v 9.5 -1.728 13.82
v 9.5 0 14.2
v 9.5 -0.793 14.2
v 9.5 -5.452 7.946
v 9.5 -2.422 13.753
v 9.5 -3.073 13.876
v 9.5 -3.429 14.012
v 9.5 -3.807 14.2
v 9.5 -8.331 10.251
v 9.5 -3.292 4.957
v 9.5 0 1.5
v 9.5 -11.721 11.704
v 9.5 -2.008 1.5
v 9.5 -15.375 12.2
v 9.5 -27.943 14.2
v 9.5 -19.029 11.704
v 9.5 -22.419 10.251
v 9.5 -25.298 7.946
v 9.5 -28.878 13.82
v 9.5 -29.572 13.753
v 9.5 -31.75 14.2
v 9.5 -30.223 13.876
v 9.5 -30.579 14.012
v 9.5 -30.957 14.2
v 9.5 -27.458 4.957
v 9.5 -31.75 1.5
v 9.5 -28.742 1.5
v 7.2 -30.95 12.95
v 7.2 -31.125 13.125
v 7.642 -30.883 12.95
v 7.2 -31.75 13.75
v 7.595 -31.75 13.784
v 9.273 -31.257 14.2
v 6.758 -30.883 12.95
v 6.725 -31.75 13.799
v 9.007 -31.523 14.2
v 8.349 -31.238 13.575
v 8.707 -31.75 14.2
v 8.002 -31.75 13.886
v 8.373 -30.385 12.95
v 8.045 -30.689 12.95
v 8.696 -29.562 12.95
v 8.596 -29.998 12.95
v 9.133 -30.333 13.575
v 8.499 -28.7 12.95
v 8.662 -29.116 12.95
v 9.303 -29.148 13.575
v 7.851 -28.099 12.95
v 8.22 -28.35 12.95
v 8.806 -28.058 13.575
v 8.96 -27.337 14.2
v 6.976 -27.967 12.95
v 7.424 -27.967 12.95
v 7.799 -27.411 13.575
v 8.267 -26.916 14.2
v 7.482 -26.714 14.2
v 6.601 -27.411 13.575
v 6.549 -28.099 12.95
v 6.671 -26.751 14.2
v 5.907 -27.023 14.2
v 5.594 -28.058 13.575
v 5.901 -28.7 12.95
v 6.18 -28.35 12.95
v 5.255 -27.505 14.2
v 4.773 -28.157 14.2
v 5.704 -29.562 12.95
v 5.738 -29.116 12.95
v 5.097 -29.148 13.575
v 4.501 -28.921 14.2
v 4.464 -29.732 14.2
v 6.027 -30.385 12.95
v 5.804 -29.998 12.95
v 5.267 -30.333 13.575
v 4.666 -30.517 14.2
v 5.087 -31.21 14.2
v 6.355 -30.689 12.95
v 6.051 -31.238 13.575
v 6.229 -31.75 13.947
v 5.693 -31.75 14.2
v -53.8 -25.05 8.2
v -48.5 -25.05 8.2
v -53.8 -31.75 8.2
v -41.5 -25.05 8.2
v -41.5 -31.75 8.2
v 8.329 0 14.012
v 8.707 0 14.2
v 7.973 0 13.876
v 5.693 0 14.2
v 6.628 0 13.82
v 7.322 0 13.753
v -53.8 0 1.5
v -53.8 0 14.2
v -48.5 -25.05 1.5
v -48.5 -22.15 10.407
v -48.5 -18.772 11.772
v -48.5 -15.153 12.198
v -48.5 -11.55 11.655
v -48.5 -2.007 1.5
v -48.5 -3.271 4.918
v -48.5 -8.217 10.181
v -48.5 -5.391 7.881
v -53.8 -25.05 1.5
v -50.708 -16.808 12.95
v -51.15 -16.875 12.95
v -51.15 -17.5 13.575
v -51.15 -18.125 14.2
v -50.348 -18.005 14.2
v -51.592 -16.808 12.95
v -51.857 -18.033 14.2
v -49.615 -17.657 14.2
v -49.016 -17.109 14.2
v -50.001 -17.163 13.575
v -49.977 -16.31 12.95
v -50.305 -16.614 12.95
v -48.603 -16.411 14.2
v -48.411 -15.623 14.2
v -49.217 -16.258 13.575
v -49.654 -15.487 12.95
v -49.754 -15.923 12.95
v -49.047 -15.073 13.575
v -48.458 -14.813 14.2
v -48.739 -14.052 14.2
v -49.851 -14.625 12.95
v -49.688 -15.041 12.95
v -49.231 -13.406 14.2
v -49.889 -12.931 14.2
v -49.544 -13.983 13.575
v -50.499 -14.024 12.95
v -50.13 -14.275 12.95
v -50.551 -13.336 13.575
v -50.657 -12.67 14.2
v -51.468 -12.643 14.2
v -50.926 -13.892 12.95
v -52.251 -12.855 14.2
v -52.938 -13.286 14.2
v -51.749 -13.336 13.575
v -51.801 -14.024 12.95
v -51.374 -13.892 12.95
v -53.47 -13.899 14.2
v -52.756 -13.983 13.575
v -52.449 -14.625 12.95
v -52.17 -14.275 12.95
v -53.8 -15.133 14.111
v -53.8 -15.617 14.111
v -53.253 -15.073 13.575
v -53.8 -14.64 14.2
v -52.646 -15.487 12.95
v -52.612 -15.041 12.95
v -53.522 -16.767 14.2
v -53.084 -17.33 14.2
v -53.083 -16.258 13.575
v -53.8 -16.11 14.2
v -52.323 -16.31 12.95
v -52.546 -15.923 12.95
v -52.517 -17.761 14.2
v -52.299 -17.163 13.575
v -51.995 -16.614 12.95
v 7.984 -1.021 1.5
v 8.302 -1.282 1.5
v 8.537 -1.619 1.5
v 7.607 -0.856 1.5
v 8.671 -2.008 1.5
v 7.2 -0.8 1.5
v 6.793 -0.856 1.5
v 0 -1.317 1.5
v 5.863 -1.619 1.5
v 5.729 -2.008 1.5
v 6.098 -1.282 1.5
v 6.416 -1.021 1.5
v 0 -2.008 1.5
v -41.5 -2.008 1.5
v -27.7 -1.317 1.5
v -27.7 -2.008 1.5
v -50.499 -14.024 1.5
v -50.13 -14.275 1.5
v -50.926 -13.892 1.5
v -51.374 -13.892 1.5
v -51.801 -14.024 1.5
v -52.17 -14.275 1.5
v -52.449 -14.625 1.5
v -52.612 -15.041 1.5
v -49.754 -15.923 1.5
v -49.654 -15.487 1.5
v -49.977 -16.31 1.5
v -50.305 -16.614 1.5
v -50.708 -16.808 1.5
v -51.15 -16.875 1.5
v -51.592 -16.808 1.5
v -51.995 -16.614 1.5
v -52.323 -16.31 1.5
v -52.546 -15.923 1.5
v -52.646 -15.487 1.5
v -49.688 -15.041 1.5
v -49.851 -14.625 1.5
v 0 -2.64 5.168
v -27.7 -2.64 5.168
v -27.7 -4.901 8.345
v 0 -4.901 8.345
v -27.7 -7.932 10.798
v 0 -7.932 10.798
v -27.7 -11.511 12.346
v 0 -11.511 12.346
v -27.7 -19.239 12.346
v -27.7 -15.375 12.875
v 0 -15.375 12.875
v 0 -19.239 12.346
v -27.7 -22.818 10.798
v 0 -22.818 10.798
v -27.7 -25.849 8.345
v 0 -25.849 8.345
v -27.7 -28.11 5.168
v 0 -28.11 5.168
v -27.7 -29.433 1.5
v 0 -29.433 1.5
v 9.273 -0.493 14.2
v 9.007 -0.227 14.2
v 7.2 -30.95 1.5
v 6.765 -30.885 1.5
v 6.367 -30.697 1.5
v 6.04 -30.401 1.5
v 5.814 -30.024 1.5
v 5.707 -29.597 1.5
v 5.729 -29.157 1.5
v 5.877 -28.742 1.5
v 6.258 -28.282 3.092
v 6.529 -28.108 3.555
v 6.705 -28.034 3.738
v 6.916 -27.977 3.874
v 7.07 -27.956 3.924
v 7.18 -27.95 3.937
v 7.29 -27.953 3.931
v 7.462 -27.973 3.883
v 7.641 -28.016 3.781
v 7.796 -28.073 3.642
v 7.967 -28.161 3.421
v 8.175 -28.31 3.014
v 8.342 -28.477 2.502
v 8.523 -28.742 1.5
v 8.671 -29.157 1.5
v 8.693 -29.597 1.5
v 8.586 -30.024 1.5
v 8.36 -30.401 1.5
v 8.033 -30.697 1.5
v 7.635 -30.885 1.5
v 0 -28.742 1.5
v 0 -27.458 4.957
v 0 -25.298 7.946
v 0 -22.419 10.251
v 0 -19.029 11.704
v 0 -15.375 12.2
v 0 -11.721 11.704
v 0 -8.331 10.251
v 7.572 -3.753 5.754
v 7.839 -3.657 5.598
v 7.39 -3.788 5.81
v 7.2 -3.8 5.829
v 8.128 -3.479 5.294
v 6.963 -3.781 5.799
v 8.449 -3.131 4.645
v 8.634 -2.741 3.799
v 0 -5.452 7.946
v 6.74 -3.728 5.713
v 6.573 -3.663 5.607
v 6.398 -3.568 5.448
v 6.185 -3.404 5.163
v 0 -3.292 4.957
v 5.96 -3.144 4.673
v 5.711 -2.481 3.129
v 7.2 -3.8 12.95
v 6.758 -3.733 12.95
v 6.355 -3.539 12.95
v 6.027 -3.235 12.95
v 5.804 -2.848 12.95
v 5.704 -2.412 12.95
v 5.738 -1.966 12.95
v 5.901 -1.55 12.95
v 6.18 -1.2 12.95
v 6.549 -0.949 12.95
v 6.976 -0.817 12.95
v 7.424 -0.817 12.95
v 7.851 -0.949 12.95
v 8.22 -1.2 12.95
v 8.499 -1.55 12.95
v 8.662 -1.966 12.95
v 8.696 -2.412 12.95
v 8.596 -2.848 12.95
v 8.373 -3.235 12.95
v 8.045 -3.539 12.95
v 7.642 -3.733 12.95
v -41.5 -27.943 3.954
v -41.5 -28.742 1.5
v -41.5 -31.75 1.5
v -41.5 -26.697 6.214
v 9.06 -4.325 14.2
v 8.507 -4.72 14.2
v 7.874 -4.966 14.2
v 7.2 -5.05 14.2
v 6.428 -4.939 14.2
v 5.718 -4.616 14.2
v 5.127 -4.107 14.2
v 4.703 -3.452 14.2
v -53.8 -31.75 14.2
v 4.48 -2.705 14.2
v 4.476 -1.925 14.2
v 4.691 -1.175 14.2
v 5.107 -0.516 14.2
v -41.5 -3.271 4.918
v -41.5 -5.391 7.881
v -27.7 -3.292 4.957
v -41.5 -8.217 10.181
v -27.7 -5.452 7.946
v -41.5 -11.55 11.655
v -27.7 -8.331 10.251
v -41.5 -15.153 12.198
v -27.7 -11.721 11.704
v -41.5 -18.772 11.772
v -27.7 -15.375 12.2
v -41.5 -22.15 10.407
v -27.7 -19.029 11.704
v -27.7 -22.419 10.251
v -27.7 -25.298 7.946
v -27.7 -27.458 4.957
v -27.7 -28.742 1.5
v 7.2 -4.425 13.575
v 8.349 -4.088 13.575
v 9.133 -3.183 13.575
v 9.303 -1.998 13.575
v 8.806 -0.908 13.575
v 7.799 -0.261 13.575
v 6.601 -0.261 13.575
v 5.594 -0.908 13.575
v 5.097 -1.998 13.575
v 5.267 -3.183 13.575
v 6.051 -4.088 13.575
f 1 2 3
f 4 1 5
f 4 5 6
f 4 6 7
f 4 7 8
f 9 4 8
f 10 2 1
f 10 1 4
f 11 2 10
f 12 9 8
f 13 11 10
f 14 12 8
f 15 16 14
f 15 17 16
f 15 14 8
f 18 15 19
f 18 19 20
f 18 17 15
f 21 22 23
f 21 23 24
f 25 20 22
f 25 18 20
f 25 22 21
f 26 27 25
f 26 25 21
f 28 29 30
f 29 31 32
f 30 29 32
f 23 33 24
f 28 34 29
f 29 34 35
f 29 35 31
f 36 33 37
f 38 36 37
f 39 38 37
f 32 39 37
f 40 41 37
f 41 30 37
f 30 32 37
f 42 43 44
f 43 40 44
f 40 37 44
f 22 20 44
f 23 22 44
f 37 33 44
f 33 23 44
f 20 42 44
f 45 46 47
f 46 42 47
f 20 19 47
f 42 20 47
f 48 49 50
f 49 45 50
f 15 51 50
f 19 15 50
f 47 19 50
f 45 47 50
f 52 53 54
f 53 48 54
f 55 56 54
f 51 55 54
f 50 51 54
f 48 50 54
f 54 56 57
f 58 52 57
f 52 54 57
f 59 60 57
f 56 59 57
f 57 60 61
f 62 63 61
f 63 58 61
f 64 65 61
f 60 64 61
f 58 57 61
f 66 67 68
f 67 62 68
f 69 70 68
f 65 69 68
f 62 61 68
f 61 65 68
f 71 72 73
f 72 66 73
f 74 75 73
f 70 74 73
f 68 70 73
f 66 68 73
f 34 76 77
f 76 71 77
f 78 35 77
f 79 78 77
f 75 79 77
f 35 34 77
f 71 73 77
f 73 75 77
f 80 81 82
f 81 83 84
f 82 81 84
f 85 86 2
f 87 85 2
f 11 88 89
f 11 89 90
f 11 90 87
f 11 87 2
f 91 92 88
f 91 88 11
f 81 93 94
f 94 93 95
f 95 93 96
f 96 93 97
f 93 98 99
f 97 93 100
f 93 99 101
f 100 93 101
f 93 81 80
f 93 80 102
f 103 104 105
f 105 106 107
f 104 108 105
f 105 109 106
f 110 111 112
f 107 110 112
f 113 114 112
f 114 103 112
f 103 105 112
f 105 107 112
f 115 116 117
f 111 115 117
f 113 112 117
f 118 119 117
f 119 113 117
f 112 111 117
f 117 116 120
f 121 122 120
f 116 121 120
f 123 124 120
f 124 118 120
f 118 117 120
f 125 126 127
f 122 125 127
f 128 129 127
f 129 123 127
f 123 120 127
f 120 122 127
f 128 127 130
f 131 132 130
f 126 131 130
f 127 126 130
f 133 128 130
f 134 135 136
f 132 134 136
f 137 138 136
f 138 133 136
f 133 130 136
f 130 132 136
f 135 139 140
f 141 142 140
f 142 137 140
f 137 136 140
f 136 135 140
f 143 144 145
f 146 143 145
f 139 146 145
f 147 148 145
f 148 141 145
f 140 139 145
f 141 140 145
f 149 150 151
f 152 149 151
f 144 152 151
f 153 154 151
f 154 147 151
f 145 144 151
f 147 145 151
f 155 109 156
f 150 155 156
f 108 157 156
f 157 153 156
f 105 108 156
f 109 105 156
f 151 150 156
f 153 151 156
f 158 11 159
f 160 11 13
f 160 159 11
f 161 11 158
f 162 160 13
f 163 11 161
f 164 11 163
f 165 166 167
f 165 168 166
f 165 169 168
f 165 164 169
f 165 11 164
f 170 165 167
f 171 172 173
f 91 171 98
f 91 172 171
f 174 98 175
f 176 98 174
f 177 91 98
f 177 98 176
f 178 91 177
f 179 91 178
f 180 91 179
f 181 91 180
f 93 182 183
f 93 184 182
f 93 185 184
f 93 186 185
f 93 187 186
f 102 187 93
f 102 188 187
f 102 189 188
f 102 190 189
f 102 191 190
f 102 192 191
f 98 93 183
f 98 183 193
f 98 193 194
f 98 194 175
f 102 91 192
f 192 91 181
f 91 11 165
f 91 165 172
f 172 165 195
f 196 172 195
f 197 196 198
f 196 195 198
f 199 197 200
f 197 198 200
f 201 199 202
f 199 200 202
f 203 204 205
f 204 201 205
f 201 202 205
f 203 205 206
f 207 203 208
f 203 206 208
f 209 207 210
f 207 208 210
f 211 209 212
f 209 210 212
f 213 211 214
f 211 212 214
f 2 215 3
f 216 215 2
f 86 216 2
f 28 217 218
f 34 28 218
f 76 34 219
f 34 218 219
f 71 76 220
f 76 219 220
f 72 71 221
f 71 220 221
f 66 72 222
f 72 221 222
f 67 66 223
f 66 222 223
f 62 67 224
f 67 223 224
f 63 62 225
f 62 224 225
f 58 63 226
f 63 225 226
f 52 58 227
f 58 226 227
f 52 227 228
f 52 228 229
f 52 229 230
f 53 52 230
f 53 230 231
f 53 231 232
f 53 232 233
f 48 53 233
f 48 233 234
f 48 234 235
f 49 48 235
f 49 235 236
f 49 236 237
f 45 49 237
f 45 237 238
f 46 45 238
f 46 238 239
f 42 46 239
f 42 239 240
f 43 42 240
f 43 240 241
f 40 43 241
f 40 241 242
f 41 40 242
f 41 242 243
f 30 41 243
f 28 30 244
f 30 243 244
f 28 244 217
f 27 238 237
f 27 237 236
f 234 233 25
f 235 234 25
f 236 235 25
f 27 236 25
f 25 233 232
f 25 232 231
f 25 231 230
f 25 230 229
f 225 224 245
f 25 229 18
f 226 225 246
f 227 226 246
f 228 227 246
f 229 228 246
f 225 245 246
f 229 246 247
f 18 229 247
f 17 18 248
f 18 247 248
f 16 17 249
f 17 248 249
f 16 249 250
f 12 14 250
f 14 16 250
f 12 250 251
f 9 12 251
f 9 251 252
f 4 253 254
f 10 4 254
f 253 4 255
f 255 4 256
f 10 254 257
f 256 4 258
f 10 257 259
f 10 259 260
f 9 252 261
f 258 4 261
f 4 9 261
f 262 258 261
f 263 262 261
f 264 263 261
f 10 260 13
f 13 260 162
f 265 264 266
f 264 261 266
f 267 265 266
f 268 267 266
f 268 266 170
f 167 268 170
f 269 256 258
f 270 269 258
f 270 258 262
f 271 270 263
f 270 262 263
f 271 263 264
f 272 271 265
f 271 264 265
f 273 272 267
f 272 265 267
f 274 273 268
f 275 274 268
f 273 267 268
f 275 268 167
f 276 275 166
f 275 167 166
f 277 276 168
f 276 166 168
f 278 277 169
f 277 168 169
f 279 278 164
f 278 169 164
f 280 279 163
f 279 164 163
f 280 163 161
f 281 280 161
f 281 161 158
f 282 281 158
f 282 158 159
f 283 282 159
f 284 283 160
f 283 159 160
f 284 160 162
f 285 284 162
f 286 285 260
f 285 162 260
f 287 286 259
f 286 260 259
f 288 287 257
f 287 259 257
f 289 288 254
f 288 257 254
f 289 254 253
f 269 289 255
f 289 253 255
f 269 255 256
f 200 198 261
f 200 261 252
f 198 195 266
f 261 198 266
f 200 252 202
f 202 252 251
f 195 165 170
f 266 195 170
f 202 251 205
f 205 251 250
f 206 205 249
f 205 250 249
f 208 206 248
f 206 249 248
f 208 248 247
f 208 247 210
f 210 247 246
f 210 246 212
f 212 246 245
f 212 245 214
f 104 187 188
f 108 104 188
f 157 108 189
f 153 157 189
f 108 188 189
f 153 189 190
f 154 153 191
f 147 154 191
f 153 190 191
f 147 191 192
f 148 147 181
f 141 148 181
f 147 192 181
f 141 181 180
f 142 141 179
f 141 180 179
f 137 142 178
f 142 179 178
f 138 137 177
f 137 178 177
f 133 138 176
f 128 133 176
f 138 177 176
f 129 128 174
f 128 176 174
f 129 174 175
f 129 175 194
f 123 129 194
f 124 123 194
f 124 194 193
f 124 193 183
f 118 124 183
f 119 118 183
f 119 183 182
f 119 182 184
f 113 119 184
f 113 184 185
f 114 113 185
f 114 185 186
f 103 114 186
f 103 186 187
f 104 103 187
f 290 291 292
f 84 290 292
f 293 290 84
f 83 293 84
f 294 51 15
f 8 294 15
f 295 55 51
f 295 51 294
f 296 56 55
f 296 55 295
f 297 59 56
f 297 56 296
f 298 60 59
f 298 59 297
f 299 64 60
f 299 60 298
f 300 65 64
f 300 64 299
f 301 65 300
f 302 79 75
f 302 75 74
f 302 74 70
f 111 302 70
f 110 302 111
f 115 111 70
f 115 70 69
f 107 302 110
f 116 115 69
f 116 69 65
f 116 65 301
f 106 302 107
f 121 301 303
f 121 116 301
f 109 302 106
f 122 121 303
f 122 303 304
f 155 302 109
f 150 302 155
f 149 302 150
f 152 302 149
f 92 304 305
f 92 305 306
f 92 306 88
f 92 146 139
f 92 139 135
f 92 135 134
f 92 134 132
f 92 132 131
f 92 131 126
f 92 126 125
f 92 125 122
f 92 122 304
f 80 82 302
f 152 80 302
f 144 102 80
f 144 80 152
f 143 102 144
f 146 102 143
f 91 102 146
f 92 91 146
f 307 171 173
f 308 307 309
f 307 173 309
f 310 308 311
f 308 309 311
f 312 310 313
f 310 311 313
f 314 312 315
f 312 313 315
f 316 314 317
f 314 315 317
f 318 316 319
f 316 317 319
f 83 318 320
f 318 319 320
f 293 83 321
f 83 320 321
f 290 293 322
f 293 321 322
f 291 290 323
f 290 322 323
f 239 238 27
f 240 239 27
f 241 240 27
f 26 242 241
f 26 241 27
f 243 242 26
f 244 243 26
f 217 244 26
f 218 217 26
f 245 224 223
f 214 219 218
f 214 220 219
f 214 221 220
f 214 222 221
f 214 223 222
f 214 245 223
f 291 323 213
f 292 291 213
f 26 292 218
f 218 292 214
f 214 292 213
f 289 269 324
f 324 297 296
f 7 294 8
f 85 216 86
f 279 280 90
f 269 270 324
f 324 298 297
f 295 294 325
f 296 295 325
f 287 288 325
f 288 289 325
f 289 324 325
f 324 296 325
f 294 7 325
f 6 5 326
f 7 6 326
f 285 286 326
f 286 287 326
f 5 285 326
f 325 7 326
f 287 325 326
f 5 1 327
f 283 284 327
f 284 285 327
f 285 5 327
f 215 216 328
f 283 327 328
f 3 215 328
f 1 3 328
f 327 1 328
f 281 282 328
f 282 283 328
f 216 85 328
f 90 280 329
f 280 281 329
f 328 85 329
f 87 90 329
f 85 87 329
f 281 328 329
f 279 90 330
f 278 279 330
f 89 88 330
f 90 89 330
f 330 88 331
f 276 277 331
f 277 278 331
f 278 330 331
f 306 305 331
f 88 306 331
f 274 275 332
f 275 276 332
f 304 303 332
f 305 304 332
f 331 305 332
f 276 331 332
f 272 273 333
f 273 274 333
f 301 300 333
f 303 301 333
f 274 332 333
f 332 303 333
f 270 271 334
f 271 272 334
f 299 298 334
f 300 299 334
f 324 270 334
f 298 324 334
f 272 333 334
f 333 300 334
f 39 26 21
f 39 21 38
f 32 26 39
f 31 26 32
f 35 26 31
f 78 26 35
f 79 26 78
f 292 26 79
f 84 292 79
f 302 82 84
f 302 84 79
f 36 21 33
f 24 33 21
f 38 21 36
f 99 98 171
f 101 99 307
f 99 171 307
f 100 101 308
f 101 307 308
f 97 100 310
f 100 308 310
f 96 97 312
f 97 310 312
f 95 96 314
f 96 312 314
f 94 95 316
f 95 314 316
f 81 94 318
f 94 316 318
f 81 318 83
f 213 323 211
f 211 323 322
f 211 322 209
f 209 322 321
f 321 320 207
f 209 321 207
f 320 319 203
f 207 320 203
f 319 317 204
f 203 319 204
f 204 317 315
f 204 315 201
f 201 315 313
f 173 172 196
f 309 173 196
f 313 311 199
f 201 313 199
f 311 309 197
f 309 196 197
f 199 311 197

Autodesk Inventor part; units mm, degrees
ref_plane "Work Plane1" through (0, -15.375, -1.5) normal (1, 0, 0) x (0, -1, 0)
sketch "Sketch1" plane through (0, -15.375, -1.5) normal (1, 0, 0) x (0, -1, 0)
  circle A0 centre (8, 0) radius 1.0564 projected
  circle A1 centre (-8, 0) radius 1.0564 projected
  circle A2 centre (0, 0) radius 5 projected
  circle A3 centre (0, 0) radius 13.7 projected
  line L0 (16.375, -1.5) -> (9.8735, -1.5) projected
  line L1 (16.375, -1.5) -> (16.375, 15.375) projected
  line L2 (16.375, 15.375) -> (-15.375, 15.375) projected
  line L3 (-15.375, 15.375) -> (-15.375, -1.5) projected
  line L4 (-15.375, -1.5) -> (-9.8735, -1.5) projected
  arc A4 (-6.7025, 2.019) -> (-9.8735, -1.5) centre (-8, 0) ccw projected
  arc A5 (6.7025, 2.019) -> (-6.7025, 2.019) centre (0, 0) ccw projected
  arc A6 (9.8735, -1.5) -> (6.7025, 2.019) centre (8, 0) ccw projected
  line L5 (16.375, -15.7) -> (-15.375, -15.7)
  line L6 (-15.375, -15.7) -> (-15.375, -3)
  line L7 (-15.375, -3) -> (16.375, -3)
  line L8 (16.375, -3) -> (16.375, -15.7)
  point P0 (0, -13.7)
  point P1 (13.3675, -3)
  point P2 (-13.3675, -3)
  dimension "d0" = 1.5
  dimension "d1" = 2
ref_plane "Work Plane2" through (9.5, -31.75, -16.875) normal (1, 0, 0) x (0, 1, 0)
extrude "Extrusion1" add sketch "Sketch1" along normal up to surface (9.5 mm away) contours A3 L7 L8 L5 L6
sketch "Sketch2" plane through (0, -15.375, -1.5) normal (-1, 0, 0) x (0, 0, 1)
  circle A0 centre (0, 0) radius 14.375 projected
  line L0 (15.7, 15.375) -> (15.7, -16.375) projected
  line L1 (3, 15.375) -> (15.7, 15.375) projected
  line L2 (3, 13.3675) -> (3, 15.375) projected
  arc A1 (3, -13.3675) -> (3, 13.3675) centre (0, 0) ccw projected
  line L3 (3, -16.375) -> (3, -13.3675) projected
  line L4 (15.7, -16.375) -> (3, -16.375) projected
  point P0 (1.5, 15.375)
  point P1 (3, 14.0585)
  point P2 (3, -14.0585)
ref_plane "Work Plane3" through (-27.7, -29.75, -15.875) normal (-1, 0, 0) x (0, 0, 1)
extrude "Extrusion2" add sketch "Sketch2" along normal up to surface (27.7 mm away) contours A0 L2 L1 L0 L4 L3
sketch "Sketch3" plane through (-27.7, -15.375, -1.5) normal (-1, 0, 0) x (0, 0, 1)
  line L0 (-1.5, 11) -> (-1.5, 11.5) projected
  line L1 (-1.5, 11.5) -> (1.5, 11.5) projected
  line L2 (1.5, 11.5) -> (1.5, 11) projected
  line L3 (1.5, 11) -> (-1.5, 11) projected
  line L4 (1.5, -11.5) -> (1.5, -12) projected
  line L5 (1.5, -12) -> (-1.5, -12) projected
  line L6 (-1.5, -12) -> (-1.5, -11.5) projected
  line L7 (-1.5, -11.5) -> (1.5, -11.5) projected
  circle A0 centre (0, 0) radius 5 projected
  circle A1 centre (0, 0) radius 13.7 projected
  line L8 (15.7, -16.375) -> (3, -16.375) projected
  line L9 (15.7, 15.375) -> (15.7, -16.375) projected
  line L10 (3, 15.375) -> (15.7, 15.375) projected
  line L11 (3, 14.0585) -> (3, 15.375) projected
  arc A2 (3, -14.0585) -> (3, 14.0585) centre (0, 0) ccw projected
  line L12 (3, -16.375) -> (3, -14.0585) projected
  circle A3 centre (0, 0) radius 14.375 projected
  circle A4 centre (0, 0) radius 13.7 projected
  line L13 (15.7, 15.375) -> (3, 15.375) projected
  line L14 (15.7, 15.375) -> (3, 15.375)
  line L15 (3, 15.375) -> (3, -16.375)
  line L16 (3, -16.375) -> (15.7, -16.375)
  line L17 (15.7, -16.375) -> (15.7, 15.375)
  point P0 (1.5, 15.375)
  point P1 (3, -13.3675)
  point P2 (3, -14.0585)
  point P3 (3, 13.3675)
ref_plane "Work Plane4" through (-41.5, -31.75, -7.5) normal (-1, 0, 0) x (0, 0, 1)
extrude "Extrusion3" add sketch "Sketch3" along normal up to surface (13.8 mm away) contours L15 A2 A1 | L11 L10 L9 L8 L12 A2
sketch "Sketch4" plane through (-41.5, -15.375, -1.5) normal (-1, 0, 0) x (0, 0, 1)
  arc A0 (3, -13.3675) -> (3, 13.3675) centre (0, 0) ccw projected
  line L0 (3, -16.375) -> (3, -13.3675) projected
  line L1 (15.7, -16.375) -> (3, -16.375) projected
  line L2 (15.7, 15.375) -> (15.7, -16.375) projected
  line L3 (3, 15.375) -> (15.7, 15.375) projected
  line L4 (3, 13.3675) -> (3, 15.375) projected
  line L5 (15.7, 15.375) -> (3, 15.375) projected
  line L6 (3, -16.375) -> (15.7, -16.375) projected
  line L7 (15.7, 15.375) -> (9.7, 15.375)
  line L8 (9.7, 15.375) -> (9.7, -16.375)
  line L9 (9.7, -16.375) -> (15.7, -16.375)
  line L10 (15.7, -16.375) -> (15.7, 15.375)
  point P0 (1.5, 15.375)
  point P1 (9.7, -9.6747)
  point P2 (9.7, -16.375)
  dimension "d8" = 6
ref_plane "Work Plane5" through (-48.5, -20.375, -7.5) normal (1, 0, 0) x (0, 1, 0)
extrude "Extrusion4" add sketch "Sketch4" along normal up to surface (7 mm away) contours A0 L8 L3 L2 L1 | A0 L4 L3 L8
sketch "Sketch5" plane through (-48.5, -31.75, 14.2) normal (-1, 0, 0) x (0, 0, 1)
  line L0 (-12.7, 31.75) -> (-12.7, 29.7425) projected
  arc A0 (-6, 6.7003) -> (-12.7, 29.7425) centre (-15.7, 16.375) ccw projected
  line L1 (-6, 6.7003) -> (-6, 0) projected
  line L2 (-6, 0) -> (0, 0) projected
  line L3 (0, 0) -> (0, 31.75) projected
  line L4 (0, 31.75) -> (-12.7, 31.75) projected
  line L5 (-6, 0) -> (-6, 6.7003) projected
  arc A1 (-12.7, 3.0075) -> (-6, 6.7003) centre (-15.7, 16.375) ccw projected
  line L6 (-12.7, 0) -> (-12.7, 3.0075) projected
  line L7 (-6, 0) -> (-12.7, 0) projected
  line L8 (0, 0) -> (0, 31.75) projected
  line L9 (-12.7, 0) -> (0, 0) projected
  line L10 (0, 31.75) -> (-12.7, 31.75)
  line L11 (-12.7, 31.75) -> (-12.7, 0)
  line L12 (-12.7, 0) -> (0, 0)
  line L13 (0, 0) -> (0, 31.75)
  line L14 (-6, 6.7003) -> (-12.7, 6.7003)
  point P0 (-14.2, 31.75)
  point P1 (-6, 6.7003)
ref_plane "Work Plane6" through (-53.8, -31.75, -16.875) normal (-1, 0, 0) x (0, 0, 1)
extrude "Extrusion5" add sketch "Sketch5" along normal up to surface (5.3 mm away) contours L4 L3 L2 L1 A0 L0 | A0 L14 L11
sketch "Sketch6" plane through (9.5, -31.75, 14.2) normal (0, 0, 1) x (1, 0, 0)
  circle A0 centre (-2.3, 29.45) radius 1.55 projected
  circle A1 centre (-2.3, 2.3) radius 1.55 projected
  circle A2 centre (-60.65, 16.375) radius 1.55 projected
  point P0 (-9.5, 31.75)
hole "Hole1" at (7.2, -2.3, 14.2) at (7.2, -29.45, 14.2) at (-51.15, -15.375, 14.2) direction (0, 0, -1) diameter 3 depth 14.5 countersink diameter 5.5 countersink angle 90 clearance for "Countersunk Flat Head Screw ISO 2009/7046" size "M2.5" standard "ISO"
properties part number "right_motor_ceil"
